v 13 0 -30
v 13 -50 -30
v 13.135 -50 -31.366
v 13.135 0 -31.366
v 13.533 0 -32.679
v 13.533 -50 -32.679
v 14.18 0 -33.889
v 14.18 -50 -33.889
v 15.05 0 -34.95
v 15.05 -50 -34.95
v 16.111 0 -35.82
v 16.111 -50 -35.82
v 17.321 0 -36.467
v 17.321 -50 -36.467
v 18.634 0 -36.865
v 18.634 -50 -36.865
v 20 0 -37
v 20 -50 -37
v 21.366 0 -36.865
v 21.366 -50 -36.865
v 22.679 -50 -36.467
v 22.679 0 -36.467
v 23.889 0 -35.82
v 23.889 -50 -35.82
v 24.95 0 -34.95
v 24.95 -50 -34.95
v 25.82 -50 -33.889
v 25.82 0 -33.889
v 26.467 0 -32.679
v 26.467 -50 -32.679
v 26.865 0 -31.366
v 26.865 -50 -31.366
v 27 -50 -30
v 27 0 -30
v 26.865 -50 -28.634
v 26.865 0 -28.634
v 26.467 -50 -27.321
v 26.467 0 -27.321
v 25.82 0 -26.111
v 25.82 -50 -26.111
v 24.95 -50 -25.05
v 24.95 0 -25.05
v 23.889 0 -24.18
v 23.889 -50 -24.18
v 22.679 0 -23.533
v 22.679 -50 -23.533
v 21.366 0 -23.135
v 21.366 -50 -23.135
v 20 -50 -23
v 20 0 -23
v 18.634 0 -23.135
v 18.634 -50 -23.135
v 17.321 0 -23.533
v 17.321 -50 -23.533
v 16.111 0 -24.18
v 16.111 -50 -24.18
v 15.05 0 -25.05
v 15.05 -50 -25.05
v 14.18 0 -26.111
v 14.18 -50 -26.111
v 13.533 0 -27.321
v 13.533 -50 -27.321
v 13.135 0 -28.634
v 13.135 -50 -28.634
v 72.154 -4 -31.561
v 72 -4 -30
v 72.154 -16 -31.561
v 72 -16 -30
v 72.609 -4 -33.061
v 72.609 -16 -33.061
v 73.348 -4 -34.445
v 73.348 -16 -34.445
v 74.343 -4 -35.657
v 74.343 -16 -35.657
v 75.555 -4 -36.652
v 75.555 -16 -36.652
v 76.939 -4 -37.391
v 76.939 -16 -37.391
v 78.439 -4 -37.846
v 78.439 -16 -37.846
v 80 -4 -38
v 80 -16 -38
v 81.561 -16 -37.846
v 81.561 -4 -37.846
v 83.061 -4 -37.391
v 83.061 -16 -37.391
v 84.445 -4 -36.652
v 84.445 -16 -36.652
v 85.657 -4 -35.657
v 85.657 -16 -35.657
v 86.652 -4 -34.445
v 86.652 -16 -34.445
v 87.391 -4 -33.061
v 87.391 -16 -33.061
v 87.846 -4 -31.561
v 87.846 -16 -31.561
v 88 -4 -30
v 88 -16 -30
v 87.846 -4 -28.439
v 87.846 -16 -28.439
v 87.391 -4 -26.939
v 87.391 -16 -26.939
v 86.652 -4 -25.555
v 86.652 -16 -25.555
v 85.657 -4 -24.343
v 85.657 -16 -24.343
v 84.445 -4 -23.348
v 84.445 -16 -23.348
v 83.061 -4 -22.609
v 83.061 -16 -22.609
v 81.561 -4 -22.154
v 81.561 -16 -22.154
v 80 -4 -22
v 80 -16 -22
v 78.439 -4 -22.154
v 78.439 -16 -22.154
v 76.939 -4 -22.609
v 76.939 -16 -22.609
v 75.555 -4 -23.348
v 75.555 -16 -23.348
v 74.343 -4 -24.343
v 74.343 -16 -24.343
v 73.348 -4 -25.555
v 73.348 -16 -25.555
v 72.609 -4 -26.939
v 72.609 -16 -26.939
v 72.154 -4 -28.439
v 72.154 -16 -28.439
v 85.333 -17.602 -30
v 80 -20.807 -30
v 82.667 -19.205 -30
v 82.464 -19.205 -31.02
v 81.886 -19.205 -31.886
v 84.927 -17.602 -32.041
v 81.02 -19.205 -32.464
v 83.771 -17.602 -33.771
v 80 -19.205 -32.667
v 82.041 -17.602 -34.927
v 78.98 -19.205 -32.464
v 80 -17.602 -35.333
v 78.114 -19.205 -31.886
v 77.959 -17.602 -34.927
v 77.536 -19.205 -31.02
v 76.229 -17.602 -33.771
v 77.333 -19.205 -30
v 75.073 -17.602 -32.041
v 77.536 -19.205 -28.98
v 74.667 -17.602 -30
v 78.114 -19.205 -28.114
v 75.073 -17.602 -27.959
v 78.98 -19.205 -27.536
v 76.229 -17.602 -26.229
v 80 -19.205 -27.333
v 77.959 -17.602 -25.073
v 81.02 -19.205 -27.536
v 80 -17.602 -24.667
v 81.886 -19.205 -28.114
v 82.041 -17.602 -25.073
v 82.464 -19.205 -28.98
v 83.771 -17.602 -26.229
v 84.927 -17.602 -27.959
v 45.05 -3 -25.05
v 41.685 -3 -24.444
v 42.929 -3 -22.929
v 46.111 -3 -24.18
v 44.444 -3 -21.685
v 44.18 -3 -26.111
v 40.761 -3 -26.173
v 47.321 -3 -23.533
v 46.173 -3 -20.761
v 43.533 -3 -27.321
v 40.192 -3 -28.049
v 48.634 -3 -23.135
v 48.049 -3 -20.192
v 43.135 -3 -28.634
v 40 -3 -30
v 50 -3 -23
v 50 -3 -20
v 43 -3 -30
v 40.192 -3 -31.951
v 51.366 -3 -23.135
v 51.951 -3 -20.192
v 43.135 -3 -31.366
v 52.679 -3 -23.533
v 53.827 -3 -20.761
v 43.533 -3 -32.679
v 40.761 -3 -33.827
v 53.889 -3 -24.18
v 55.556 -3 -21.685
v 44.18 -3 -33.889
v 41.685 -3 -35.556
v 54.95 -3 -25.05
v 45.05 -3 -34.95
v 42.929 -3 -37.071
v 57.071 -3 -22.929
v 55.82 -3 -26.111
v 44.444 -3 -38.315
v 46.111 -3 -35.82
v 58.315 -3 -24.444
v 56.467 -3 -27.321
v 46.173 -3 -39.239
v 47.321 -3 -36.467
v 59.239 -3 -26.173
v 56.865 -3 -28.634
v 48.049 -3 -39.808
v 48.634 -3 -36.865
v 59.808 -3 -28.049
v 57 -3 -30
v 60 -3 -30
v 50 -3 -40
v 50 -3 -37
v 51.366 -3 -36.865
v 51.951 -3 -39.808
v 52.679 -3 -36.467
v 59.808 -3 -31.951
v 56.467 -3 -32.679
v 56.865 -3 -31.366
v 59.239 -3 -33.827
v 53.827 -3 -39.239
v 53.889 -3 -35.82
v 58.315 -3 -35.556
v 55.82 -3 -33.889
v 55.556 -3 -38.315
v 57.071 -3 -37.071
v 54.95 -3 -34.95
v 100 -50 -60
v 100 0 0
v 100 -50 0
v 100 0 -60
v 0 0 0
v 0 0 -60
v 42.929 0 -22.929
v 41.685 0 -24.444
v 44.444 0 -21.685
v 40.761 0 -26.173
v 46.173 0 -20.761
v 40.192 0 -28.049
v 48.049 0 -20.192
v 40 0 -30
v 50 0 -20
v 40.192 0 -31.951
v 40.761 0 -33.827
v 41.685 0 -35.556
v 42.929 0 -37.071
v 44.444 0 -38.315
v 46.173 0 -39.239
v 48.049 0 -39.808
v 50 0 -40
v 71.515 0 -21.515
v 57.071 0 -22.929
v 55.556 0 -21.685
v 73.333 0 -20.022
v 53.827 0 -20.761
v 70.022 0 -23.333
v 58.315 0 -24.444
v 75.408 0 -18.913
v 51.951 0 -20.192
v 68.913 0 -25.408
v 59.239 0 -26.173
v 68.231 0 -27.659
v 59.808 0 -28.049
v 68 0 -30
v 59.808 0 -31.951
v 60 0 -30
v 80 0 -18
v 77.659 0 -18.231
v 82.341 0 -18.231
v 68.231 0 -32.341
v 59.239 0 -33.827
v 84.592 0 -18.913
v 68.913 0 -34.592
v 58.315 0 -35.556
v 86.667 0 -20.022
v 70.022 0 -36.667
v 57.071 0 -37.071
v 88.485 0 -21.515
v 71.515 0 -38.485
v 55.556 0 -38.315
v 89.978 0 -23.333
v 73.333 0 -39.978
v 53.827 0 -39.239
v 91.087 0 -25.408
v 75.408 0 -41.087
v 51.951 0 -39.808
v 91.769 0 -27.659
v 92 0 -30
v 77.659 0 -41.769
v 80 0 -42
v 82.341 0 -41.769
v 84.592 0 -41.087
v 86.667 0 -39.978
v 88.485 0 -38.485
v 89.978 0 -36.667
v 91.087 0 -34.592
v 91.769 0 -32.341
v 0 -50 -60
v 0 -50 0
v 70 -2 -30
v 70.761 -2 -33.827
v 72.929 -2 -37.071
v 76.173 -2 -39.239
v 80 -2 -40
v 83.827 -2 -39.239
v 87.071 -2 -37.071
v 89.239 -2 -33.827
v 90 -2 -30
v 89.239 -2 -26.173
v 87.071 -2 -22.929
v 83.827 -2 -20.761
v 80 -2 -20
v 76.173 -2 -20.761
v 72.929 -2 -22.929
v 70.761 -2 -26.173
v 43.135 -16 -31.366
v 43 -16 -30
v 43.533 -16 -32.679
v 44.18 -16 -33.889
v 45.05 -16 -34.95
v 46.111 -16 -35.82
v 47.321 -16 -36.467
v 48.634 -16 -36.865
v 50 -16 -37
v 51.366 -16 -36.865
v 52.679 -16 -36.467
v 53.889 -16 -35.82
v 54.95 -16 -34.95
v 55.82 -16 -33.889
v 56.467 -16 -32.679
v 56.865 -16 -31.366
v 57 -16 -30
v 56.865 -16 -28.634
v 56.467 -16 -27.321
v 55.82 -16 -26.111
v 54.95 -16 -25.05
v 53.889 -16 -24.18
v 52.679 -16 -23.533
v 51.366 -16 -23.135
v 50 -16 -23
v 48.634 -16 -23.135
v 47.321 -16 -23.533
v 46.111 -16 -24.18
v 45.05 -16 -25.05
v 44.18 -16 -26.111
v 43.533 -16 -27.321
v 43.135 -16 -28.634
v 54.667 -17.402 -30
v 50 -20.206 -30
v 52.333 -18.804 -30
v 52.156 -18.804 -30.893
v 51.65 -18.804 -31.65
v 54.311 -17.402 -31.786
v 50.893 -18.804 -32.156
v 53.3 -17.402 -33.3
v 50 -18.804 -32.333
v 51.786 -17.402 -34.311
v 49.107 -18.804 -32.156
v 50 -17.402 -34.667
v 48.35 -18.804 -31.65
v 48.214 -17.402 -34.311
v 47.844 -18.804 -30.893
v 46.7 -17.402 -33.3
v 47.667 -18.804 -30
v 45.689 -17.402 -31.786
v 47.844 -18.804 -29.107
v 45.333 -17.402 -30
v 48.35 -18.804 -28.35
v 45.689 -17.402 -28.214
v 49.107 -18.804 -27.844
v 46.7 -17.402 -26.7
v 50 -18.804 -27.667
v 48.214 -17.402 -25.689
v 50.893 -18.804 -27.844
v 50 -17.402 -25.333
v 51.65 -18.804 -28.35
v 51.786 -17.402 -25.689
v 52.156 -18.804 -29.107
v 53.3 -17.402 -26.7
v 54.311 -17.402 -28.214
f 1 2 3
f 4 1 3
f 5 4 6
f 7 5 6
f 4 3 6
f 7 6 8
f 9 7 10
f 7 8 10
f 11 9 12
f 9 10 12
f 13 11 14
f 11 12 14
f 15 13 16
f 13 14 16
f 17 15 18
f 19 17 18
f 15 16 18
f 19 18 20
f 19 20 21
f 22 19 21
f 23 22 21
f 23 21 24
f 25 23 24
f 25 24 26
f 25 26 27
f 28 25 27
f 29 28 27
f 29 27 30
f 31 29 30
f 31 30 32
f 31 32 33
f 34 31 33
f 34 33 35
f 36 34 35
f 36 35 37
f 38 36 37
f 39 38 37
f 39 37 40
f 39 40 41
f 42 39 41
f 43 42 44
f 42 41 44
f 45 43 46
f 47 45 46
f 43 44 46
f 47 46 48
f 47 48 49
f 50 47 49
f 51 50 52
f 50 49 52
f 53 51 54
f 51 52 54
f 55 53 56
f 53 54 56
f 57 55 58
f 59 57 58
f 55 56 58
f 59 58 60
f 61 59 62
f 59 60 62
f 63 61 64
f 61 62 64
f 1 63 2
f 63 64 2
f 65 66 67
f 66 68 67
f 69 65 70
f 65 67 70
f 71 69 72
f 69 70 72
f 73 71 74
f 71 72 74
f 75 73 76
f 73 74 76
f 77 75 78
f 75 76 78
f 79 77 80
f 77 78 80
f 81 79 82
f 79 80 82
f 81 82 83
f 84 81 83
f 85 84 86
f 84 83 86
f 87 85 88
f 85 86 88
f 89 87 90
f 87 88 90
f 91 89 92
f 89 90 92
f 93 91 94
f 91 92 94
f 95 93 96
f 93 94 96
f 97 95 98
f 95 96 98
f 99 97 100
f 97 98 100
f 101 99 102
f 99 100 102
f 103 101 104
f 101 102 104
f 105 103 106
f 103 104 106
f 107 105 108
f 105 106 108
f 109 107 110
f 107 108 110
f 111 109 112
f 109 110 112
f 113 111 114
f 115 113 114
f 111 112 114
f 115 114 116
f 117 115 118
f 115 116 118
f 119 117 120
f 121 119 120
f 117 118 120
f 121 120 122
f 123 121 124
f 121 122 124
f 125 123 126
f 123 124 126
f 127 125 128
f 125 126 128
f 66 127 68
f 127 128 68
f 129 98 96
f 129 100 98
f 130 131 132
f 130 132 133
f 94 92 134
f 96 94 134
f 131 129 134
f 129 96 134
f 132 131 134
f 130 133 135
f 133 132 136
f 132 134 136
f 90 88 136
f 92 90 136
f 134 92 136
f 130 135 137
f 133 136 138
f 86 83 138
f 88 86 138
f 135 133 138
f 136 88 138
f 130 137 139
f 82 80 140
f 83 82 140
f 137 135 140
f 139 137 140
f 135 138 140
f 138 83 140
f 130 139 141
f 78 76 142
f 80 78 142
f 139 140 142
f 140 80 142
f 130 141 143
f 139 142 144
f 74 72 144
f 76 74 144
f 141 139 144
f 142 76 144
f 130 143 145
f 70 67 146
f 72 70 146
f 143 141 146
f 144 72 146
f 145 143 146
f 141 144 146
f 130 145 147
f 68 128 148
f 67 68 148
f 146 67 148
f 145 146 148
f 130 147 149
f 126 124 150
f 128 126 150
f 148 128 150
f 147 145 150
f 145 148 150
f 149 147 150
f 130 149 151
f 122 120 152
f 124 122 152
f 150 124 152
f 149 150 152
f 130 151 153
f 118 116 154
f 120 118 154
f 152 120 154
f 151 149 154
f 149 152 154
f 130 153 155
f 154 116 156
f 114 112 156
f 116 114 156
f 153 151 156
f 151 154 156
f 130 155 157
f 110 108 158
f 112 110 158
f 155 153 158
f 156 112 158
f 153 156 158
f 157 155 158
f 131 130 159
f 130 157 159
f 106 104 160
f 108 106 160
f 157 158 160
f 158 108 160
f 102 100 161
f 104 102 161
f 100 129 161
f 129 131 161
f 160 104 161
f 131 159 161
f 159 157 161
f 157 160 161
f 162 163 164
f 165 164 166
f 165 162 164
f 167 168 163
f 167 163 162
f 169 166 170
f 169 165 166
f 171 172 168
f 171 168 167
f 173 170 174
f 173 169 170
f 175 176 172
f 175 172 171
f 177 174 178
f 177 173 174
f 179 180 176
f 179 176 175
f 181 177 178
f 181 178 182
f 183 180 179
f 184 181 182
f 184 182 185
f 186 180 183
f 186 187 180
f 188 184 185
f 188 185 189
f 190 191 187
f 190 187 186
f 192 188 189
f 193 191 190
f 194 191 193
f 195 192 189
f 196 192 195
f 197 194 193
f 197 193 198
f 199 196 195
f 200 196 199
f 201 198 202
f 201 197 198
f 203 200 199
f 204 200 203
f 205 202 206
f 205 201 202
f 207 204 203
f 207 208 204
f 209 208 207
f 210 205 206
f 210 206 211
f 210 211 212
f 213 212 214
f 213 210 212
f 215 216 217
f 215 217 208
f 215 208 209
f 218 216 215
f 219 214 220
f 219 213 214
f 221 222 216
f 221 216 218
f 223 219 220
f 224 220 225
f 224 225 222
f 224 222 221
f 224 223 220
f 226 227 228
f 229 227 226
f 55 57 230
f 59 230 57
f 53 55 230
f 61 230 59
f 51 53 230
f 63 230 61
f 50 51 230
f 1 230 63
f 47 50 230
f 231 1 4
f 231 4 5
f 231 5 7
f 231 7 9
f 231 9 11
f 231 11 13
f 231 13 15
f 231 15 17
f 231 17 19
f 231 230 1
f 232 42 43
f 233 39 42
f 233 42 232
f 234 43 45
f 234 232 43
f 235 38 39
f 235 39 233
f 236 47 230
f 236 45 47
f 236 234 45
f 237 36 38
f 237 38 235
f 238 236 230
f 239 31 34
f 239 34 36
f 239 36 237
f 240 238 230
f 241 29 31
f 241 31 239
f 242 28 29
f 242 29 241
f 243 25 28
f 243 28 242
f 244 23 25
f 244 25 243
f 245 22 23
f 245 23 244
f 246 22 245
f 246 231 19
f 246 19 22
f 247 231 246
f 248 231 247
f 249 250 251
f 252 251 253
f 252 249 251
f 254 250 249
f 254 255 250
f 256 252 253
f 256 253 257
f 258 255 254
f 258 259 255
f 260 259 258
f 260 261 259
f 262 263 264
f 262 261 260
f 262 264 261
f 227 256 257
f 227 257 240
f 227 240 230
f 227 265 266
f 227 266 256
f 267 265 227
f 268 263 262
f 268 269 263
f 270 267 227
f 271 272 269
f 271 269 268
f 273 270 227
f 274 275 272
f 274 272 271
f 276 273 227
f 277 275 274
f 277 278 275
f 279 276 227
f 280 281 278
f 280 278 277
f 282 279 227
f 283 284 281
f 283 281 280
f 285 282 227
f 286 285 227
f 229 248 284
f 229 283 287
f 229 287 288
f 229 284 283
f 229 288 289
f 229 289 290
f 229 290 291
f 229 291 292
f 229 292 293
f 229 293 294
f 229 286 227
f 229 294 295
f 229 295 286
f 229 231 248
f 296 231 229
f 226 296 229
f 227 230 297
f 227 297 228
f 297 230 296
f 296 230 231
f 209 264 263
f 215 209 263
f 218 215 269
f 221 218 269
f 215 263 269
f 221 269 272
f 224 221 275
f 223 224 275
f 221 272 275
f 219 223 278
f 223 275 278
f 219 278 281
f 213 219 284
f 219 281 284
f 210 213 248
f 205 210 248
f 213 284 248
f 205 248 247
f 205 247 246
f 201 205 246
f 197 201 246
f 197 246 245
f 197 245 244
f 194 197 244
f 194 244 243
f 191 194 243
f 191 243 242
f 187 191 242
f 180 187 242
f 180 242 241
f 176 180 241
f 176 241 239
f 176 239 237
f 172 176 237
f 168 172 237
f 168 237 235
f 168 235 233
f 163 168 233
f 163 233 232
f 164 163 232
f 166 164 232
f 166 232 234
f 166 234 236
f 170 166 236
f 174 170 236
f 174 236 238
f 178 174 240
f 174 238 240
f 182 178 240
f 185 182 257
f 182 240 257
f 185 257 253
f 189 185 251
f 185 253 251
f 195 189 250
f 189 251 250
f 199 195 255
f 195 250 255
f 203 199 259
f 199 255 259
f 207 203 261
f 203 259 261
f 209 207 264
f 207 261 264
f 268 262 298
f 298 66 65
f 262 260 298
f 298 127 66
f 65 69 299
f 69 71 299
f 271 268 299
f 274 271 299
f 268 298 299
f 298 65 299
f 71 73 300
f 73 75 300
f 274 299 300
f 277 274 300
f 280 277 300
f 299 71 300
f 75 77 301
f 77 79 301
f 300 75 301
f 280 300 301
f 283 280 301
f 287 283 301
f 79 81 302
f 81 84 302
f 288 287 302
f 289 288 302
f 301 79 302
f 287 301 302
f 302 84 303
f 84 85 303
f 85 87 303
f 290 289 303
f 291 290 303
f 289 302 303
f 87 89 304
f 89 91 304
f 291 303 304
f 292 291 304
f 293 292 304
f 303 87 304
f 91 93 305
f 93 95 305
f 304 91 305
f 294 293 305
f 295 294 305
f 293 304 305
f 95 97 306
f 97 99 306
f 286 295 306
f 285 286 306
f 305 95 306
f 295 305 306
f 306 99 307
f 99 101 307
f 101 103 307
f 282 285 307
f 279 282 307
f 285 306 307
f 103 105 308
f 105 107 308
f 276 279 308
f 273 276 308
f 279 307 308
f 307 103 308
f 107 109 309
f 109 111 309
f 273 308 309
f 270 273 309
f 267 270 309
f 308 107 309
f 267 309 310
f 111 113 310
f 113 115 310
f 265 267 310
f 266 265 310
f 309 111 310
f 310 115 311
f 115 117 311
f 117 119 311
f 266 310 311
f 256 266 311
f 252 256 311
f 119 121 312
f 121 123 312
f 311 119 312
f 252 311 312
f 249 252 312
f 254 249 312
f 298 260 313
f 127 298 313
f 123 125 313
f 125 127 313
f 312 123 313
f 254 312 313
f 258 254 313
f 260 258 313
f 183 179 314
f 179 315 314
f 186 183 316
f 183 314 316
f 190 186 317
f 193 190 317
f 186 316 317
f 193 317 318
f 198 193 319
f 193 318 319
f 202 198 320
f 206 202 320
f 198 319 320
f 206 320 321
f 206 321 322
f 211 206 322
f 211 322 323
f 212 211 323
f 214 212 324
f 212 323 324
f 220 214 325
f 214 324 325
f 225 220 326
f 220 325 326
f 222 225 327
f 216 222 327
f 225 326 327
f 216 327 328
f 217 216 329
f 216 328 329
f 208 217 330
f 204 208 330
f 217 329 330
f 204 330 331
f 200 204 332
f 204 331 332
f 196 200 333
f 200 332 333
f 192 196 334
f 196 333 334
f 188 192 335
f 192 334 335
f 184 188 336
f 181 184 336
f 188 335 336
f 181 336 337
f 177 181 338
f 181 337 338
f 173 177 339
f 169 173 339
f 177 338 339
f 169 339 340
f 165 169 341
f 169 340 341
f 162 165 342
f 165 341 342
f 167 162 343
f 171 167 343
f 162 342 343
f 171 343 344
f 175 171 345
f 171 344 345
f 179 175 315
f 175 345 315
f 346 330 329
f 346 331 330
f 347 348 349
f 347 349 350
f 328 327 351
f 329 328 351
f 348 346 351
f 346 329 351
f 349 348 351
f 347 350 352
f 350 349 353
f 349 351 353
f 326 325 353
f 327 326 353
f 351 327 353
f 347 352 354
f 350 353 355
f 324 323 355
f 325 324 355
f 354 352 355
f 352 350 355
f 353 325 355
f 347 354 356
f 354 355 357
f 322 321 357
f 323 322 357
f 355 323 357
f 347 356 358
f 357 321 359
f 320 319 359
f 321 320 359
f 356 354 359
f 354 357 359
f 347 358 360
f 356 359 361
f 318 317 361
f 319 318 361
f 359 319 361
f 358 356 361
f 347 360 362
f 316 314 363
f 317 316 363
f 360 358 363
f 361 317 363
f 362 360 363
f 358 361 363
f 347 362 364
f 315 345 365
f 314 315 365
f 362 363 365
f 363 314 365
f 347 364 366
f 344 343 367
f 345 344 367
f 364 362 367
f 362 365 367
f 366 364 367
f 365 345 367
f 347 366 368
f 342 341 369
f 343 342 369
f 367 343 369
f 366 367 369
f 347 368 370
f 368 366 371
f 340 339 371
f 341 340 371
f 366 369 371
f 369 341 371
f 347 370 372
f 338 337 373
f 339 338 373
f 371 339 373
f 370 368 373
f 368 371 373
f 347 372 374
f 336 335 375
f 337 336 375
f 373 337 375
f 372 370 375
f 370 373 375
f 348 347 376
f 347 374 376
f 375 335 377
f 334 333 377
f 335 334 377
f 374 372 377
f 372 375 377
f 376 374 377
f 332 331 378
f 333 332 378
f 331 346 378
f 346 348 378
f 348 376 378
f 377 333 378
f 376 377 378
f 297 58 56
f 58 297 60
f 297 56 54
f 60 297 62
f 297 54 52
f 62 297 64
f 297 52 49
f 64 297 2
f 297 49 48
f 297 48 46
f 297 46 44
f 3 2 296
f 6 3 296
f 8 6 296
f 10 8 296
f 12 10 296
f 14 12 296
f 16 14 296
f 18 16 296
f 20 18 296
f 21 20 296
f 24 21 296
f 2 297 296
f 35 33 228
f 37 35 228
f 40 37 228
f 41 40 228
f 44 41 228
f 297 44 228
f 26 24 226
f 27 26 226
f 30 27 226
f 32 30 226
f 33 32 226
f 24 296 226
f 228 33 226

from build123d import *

# Parameters (mm, degrees)
SKETCH1_W                                       = 100
SKETCH1_H                                       = 60
BOSS_EXTRUDE1_DEPTH                             = 50
CBORE_FOR_M5_HEX_HEAD_BOLT1_D                   = 14
CBORE_FOR_M5_HEX_HEAD_BOLT1_DEPTH               = 16
CBORE_FOR_M5_HEX_HEAD_BOLT1_CBORE_D             = 20
CBORE_FOR_M5_HEX_HEAD_BOLT1_CBORE_DEPTH         = 3
CBORE_FOR_M5_HEX_HEAD_BOLT1_TIP                 = 4.206024333
CSK_FOR_M5_FLAT_HEAD_MACHINE_SCREW1_D           = 16
CSK_FOR_M5_FLAT_HEAD_MACHINE_SCREW1_DEPTH       = 16
CSK_FOR_M5_FLAT_HEAD_MACHINE_SCREW1_CSINK_D     = 24
CSK_FOR_M5_FLAT_HEAD_MACHINE_SCREW1_CSINK_ANGLE = 90
CSK_FOR_M5_FLAT_HEAD_MACHINE_SCREW1_TIP         = 4.806884952
M16X2_0_TAPPED_HOLE1_D                          = 14


with BuildPart() as part:
    # Sketch1 → Boss-Extrude1 (new body)
    with BuildSketch(Plane(origin=(0, 0, 0), x_dir=(1, 0, 0), z_dir=(0, 1, 0))):
        with Locations((50, 30)):
            Rectangle(SKETCH1_W, SKETCH1_H)
    extrude(amount=-BOSS_EXTRUDE1_DEPTH)

    # CBORE for M5 Hex Head Bolt1
    with Locations(Plane(origin=(0, 0, 0), x_dir=(1, 0, 0), z_dir=(0, 1, 0))):
        with Locations((50, 30)):
            CounterBoreHole(CBORE_FOR_M5_HEX_HEAD_BOLT1_D / 2, CBORE_FOR_M5_HEX_HEAD_BOLT1_CBORE_D / 2, CBORE_FOR_M5_HEX_HEAD_BOLT1_CBORE_DEPTH, depth=CBORE_FOR_M5_HEX_HEAD_BOLT1_DEPTH)
            with Locations((0, 0, -(CBORE_FOR_M5_HEX_HEAD_BOLT1_DEPTH + CBORE_FOR_M5_HEX_HEAD_BOLT1_TIP / 2))):  # 118° drill point
                Cone(0, CBORE_FOR_M5_HEX_HEAD_BOLT1_D / 2, CBORE_FOR_M5_HEX_HEAD_BOLT1_TIP, mode=Mode.SUBTRACT)

    # CSK for M5 Flat Head Machine Screw1
    with Locations(Plane(origin=(0, 0, 0), x_dir=(1, 0, 0), z_dir=(0, 1, 0))):
        with Locations((80, 30)):
            CounterSinkHole(CSK_FOR_M5_FLAT_HEAD_MACHINE_SCREW1_D / 2, CSK_FOR_M5_FLAT_HEAD_MACHINE_SCREW1_CSINK_D / 2, depth=CSK_FOR_M5_FLAT_HEAD_MACHINE_SCREW1_DEPTH, counter_sink_angle=CSK_FOR_M5_FLAT_HEAD_MACHINE_SCREW1_CSINK_ANGLE)
            with Locations((0, 0, -(CSK_FOR_M5_FLAT_HEAD_MACHINE_SCREW1_DEPTH + CSK_FOR_M5_FLAT_HEAD_MACHINE_SCREW1_TIP / 2))):  # 118° drill point
                Cone(0, CSK_FOR_M5_FLAT_HEAD_MACHINE_SCREW1_D / 2, CSK_FOR_M5_FLAT_HEAD_MACHINE_SCREW1_TIP, mode=Mode.SUBTRACT)

    # M16x2.0 Tapped Hole1 (through all)
    with Locations(Plane(origin=(0, 0, 0), x_dir=(1, 0, 0), z_dir=(0, 1, 0))):
        with Locations((20, 30)):
            Hole(M16X2_0_TAPPED_HOLE1_D / 2)


solid = part.part
